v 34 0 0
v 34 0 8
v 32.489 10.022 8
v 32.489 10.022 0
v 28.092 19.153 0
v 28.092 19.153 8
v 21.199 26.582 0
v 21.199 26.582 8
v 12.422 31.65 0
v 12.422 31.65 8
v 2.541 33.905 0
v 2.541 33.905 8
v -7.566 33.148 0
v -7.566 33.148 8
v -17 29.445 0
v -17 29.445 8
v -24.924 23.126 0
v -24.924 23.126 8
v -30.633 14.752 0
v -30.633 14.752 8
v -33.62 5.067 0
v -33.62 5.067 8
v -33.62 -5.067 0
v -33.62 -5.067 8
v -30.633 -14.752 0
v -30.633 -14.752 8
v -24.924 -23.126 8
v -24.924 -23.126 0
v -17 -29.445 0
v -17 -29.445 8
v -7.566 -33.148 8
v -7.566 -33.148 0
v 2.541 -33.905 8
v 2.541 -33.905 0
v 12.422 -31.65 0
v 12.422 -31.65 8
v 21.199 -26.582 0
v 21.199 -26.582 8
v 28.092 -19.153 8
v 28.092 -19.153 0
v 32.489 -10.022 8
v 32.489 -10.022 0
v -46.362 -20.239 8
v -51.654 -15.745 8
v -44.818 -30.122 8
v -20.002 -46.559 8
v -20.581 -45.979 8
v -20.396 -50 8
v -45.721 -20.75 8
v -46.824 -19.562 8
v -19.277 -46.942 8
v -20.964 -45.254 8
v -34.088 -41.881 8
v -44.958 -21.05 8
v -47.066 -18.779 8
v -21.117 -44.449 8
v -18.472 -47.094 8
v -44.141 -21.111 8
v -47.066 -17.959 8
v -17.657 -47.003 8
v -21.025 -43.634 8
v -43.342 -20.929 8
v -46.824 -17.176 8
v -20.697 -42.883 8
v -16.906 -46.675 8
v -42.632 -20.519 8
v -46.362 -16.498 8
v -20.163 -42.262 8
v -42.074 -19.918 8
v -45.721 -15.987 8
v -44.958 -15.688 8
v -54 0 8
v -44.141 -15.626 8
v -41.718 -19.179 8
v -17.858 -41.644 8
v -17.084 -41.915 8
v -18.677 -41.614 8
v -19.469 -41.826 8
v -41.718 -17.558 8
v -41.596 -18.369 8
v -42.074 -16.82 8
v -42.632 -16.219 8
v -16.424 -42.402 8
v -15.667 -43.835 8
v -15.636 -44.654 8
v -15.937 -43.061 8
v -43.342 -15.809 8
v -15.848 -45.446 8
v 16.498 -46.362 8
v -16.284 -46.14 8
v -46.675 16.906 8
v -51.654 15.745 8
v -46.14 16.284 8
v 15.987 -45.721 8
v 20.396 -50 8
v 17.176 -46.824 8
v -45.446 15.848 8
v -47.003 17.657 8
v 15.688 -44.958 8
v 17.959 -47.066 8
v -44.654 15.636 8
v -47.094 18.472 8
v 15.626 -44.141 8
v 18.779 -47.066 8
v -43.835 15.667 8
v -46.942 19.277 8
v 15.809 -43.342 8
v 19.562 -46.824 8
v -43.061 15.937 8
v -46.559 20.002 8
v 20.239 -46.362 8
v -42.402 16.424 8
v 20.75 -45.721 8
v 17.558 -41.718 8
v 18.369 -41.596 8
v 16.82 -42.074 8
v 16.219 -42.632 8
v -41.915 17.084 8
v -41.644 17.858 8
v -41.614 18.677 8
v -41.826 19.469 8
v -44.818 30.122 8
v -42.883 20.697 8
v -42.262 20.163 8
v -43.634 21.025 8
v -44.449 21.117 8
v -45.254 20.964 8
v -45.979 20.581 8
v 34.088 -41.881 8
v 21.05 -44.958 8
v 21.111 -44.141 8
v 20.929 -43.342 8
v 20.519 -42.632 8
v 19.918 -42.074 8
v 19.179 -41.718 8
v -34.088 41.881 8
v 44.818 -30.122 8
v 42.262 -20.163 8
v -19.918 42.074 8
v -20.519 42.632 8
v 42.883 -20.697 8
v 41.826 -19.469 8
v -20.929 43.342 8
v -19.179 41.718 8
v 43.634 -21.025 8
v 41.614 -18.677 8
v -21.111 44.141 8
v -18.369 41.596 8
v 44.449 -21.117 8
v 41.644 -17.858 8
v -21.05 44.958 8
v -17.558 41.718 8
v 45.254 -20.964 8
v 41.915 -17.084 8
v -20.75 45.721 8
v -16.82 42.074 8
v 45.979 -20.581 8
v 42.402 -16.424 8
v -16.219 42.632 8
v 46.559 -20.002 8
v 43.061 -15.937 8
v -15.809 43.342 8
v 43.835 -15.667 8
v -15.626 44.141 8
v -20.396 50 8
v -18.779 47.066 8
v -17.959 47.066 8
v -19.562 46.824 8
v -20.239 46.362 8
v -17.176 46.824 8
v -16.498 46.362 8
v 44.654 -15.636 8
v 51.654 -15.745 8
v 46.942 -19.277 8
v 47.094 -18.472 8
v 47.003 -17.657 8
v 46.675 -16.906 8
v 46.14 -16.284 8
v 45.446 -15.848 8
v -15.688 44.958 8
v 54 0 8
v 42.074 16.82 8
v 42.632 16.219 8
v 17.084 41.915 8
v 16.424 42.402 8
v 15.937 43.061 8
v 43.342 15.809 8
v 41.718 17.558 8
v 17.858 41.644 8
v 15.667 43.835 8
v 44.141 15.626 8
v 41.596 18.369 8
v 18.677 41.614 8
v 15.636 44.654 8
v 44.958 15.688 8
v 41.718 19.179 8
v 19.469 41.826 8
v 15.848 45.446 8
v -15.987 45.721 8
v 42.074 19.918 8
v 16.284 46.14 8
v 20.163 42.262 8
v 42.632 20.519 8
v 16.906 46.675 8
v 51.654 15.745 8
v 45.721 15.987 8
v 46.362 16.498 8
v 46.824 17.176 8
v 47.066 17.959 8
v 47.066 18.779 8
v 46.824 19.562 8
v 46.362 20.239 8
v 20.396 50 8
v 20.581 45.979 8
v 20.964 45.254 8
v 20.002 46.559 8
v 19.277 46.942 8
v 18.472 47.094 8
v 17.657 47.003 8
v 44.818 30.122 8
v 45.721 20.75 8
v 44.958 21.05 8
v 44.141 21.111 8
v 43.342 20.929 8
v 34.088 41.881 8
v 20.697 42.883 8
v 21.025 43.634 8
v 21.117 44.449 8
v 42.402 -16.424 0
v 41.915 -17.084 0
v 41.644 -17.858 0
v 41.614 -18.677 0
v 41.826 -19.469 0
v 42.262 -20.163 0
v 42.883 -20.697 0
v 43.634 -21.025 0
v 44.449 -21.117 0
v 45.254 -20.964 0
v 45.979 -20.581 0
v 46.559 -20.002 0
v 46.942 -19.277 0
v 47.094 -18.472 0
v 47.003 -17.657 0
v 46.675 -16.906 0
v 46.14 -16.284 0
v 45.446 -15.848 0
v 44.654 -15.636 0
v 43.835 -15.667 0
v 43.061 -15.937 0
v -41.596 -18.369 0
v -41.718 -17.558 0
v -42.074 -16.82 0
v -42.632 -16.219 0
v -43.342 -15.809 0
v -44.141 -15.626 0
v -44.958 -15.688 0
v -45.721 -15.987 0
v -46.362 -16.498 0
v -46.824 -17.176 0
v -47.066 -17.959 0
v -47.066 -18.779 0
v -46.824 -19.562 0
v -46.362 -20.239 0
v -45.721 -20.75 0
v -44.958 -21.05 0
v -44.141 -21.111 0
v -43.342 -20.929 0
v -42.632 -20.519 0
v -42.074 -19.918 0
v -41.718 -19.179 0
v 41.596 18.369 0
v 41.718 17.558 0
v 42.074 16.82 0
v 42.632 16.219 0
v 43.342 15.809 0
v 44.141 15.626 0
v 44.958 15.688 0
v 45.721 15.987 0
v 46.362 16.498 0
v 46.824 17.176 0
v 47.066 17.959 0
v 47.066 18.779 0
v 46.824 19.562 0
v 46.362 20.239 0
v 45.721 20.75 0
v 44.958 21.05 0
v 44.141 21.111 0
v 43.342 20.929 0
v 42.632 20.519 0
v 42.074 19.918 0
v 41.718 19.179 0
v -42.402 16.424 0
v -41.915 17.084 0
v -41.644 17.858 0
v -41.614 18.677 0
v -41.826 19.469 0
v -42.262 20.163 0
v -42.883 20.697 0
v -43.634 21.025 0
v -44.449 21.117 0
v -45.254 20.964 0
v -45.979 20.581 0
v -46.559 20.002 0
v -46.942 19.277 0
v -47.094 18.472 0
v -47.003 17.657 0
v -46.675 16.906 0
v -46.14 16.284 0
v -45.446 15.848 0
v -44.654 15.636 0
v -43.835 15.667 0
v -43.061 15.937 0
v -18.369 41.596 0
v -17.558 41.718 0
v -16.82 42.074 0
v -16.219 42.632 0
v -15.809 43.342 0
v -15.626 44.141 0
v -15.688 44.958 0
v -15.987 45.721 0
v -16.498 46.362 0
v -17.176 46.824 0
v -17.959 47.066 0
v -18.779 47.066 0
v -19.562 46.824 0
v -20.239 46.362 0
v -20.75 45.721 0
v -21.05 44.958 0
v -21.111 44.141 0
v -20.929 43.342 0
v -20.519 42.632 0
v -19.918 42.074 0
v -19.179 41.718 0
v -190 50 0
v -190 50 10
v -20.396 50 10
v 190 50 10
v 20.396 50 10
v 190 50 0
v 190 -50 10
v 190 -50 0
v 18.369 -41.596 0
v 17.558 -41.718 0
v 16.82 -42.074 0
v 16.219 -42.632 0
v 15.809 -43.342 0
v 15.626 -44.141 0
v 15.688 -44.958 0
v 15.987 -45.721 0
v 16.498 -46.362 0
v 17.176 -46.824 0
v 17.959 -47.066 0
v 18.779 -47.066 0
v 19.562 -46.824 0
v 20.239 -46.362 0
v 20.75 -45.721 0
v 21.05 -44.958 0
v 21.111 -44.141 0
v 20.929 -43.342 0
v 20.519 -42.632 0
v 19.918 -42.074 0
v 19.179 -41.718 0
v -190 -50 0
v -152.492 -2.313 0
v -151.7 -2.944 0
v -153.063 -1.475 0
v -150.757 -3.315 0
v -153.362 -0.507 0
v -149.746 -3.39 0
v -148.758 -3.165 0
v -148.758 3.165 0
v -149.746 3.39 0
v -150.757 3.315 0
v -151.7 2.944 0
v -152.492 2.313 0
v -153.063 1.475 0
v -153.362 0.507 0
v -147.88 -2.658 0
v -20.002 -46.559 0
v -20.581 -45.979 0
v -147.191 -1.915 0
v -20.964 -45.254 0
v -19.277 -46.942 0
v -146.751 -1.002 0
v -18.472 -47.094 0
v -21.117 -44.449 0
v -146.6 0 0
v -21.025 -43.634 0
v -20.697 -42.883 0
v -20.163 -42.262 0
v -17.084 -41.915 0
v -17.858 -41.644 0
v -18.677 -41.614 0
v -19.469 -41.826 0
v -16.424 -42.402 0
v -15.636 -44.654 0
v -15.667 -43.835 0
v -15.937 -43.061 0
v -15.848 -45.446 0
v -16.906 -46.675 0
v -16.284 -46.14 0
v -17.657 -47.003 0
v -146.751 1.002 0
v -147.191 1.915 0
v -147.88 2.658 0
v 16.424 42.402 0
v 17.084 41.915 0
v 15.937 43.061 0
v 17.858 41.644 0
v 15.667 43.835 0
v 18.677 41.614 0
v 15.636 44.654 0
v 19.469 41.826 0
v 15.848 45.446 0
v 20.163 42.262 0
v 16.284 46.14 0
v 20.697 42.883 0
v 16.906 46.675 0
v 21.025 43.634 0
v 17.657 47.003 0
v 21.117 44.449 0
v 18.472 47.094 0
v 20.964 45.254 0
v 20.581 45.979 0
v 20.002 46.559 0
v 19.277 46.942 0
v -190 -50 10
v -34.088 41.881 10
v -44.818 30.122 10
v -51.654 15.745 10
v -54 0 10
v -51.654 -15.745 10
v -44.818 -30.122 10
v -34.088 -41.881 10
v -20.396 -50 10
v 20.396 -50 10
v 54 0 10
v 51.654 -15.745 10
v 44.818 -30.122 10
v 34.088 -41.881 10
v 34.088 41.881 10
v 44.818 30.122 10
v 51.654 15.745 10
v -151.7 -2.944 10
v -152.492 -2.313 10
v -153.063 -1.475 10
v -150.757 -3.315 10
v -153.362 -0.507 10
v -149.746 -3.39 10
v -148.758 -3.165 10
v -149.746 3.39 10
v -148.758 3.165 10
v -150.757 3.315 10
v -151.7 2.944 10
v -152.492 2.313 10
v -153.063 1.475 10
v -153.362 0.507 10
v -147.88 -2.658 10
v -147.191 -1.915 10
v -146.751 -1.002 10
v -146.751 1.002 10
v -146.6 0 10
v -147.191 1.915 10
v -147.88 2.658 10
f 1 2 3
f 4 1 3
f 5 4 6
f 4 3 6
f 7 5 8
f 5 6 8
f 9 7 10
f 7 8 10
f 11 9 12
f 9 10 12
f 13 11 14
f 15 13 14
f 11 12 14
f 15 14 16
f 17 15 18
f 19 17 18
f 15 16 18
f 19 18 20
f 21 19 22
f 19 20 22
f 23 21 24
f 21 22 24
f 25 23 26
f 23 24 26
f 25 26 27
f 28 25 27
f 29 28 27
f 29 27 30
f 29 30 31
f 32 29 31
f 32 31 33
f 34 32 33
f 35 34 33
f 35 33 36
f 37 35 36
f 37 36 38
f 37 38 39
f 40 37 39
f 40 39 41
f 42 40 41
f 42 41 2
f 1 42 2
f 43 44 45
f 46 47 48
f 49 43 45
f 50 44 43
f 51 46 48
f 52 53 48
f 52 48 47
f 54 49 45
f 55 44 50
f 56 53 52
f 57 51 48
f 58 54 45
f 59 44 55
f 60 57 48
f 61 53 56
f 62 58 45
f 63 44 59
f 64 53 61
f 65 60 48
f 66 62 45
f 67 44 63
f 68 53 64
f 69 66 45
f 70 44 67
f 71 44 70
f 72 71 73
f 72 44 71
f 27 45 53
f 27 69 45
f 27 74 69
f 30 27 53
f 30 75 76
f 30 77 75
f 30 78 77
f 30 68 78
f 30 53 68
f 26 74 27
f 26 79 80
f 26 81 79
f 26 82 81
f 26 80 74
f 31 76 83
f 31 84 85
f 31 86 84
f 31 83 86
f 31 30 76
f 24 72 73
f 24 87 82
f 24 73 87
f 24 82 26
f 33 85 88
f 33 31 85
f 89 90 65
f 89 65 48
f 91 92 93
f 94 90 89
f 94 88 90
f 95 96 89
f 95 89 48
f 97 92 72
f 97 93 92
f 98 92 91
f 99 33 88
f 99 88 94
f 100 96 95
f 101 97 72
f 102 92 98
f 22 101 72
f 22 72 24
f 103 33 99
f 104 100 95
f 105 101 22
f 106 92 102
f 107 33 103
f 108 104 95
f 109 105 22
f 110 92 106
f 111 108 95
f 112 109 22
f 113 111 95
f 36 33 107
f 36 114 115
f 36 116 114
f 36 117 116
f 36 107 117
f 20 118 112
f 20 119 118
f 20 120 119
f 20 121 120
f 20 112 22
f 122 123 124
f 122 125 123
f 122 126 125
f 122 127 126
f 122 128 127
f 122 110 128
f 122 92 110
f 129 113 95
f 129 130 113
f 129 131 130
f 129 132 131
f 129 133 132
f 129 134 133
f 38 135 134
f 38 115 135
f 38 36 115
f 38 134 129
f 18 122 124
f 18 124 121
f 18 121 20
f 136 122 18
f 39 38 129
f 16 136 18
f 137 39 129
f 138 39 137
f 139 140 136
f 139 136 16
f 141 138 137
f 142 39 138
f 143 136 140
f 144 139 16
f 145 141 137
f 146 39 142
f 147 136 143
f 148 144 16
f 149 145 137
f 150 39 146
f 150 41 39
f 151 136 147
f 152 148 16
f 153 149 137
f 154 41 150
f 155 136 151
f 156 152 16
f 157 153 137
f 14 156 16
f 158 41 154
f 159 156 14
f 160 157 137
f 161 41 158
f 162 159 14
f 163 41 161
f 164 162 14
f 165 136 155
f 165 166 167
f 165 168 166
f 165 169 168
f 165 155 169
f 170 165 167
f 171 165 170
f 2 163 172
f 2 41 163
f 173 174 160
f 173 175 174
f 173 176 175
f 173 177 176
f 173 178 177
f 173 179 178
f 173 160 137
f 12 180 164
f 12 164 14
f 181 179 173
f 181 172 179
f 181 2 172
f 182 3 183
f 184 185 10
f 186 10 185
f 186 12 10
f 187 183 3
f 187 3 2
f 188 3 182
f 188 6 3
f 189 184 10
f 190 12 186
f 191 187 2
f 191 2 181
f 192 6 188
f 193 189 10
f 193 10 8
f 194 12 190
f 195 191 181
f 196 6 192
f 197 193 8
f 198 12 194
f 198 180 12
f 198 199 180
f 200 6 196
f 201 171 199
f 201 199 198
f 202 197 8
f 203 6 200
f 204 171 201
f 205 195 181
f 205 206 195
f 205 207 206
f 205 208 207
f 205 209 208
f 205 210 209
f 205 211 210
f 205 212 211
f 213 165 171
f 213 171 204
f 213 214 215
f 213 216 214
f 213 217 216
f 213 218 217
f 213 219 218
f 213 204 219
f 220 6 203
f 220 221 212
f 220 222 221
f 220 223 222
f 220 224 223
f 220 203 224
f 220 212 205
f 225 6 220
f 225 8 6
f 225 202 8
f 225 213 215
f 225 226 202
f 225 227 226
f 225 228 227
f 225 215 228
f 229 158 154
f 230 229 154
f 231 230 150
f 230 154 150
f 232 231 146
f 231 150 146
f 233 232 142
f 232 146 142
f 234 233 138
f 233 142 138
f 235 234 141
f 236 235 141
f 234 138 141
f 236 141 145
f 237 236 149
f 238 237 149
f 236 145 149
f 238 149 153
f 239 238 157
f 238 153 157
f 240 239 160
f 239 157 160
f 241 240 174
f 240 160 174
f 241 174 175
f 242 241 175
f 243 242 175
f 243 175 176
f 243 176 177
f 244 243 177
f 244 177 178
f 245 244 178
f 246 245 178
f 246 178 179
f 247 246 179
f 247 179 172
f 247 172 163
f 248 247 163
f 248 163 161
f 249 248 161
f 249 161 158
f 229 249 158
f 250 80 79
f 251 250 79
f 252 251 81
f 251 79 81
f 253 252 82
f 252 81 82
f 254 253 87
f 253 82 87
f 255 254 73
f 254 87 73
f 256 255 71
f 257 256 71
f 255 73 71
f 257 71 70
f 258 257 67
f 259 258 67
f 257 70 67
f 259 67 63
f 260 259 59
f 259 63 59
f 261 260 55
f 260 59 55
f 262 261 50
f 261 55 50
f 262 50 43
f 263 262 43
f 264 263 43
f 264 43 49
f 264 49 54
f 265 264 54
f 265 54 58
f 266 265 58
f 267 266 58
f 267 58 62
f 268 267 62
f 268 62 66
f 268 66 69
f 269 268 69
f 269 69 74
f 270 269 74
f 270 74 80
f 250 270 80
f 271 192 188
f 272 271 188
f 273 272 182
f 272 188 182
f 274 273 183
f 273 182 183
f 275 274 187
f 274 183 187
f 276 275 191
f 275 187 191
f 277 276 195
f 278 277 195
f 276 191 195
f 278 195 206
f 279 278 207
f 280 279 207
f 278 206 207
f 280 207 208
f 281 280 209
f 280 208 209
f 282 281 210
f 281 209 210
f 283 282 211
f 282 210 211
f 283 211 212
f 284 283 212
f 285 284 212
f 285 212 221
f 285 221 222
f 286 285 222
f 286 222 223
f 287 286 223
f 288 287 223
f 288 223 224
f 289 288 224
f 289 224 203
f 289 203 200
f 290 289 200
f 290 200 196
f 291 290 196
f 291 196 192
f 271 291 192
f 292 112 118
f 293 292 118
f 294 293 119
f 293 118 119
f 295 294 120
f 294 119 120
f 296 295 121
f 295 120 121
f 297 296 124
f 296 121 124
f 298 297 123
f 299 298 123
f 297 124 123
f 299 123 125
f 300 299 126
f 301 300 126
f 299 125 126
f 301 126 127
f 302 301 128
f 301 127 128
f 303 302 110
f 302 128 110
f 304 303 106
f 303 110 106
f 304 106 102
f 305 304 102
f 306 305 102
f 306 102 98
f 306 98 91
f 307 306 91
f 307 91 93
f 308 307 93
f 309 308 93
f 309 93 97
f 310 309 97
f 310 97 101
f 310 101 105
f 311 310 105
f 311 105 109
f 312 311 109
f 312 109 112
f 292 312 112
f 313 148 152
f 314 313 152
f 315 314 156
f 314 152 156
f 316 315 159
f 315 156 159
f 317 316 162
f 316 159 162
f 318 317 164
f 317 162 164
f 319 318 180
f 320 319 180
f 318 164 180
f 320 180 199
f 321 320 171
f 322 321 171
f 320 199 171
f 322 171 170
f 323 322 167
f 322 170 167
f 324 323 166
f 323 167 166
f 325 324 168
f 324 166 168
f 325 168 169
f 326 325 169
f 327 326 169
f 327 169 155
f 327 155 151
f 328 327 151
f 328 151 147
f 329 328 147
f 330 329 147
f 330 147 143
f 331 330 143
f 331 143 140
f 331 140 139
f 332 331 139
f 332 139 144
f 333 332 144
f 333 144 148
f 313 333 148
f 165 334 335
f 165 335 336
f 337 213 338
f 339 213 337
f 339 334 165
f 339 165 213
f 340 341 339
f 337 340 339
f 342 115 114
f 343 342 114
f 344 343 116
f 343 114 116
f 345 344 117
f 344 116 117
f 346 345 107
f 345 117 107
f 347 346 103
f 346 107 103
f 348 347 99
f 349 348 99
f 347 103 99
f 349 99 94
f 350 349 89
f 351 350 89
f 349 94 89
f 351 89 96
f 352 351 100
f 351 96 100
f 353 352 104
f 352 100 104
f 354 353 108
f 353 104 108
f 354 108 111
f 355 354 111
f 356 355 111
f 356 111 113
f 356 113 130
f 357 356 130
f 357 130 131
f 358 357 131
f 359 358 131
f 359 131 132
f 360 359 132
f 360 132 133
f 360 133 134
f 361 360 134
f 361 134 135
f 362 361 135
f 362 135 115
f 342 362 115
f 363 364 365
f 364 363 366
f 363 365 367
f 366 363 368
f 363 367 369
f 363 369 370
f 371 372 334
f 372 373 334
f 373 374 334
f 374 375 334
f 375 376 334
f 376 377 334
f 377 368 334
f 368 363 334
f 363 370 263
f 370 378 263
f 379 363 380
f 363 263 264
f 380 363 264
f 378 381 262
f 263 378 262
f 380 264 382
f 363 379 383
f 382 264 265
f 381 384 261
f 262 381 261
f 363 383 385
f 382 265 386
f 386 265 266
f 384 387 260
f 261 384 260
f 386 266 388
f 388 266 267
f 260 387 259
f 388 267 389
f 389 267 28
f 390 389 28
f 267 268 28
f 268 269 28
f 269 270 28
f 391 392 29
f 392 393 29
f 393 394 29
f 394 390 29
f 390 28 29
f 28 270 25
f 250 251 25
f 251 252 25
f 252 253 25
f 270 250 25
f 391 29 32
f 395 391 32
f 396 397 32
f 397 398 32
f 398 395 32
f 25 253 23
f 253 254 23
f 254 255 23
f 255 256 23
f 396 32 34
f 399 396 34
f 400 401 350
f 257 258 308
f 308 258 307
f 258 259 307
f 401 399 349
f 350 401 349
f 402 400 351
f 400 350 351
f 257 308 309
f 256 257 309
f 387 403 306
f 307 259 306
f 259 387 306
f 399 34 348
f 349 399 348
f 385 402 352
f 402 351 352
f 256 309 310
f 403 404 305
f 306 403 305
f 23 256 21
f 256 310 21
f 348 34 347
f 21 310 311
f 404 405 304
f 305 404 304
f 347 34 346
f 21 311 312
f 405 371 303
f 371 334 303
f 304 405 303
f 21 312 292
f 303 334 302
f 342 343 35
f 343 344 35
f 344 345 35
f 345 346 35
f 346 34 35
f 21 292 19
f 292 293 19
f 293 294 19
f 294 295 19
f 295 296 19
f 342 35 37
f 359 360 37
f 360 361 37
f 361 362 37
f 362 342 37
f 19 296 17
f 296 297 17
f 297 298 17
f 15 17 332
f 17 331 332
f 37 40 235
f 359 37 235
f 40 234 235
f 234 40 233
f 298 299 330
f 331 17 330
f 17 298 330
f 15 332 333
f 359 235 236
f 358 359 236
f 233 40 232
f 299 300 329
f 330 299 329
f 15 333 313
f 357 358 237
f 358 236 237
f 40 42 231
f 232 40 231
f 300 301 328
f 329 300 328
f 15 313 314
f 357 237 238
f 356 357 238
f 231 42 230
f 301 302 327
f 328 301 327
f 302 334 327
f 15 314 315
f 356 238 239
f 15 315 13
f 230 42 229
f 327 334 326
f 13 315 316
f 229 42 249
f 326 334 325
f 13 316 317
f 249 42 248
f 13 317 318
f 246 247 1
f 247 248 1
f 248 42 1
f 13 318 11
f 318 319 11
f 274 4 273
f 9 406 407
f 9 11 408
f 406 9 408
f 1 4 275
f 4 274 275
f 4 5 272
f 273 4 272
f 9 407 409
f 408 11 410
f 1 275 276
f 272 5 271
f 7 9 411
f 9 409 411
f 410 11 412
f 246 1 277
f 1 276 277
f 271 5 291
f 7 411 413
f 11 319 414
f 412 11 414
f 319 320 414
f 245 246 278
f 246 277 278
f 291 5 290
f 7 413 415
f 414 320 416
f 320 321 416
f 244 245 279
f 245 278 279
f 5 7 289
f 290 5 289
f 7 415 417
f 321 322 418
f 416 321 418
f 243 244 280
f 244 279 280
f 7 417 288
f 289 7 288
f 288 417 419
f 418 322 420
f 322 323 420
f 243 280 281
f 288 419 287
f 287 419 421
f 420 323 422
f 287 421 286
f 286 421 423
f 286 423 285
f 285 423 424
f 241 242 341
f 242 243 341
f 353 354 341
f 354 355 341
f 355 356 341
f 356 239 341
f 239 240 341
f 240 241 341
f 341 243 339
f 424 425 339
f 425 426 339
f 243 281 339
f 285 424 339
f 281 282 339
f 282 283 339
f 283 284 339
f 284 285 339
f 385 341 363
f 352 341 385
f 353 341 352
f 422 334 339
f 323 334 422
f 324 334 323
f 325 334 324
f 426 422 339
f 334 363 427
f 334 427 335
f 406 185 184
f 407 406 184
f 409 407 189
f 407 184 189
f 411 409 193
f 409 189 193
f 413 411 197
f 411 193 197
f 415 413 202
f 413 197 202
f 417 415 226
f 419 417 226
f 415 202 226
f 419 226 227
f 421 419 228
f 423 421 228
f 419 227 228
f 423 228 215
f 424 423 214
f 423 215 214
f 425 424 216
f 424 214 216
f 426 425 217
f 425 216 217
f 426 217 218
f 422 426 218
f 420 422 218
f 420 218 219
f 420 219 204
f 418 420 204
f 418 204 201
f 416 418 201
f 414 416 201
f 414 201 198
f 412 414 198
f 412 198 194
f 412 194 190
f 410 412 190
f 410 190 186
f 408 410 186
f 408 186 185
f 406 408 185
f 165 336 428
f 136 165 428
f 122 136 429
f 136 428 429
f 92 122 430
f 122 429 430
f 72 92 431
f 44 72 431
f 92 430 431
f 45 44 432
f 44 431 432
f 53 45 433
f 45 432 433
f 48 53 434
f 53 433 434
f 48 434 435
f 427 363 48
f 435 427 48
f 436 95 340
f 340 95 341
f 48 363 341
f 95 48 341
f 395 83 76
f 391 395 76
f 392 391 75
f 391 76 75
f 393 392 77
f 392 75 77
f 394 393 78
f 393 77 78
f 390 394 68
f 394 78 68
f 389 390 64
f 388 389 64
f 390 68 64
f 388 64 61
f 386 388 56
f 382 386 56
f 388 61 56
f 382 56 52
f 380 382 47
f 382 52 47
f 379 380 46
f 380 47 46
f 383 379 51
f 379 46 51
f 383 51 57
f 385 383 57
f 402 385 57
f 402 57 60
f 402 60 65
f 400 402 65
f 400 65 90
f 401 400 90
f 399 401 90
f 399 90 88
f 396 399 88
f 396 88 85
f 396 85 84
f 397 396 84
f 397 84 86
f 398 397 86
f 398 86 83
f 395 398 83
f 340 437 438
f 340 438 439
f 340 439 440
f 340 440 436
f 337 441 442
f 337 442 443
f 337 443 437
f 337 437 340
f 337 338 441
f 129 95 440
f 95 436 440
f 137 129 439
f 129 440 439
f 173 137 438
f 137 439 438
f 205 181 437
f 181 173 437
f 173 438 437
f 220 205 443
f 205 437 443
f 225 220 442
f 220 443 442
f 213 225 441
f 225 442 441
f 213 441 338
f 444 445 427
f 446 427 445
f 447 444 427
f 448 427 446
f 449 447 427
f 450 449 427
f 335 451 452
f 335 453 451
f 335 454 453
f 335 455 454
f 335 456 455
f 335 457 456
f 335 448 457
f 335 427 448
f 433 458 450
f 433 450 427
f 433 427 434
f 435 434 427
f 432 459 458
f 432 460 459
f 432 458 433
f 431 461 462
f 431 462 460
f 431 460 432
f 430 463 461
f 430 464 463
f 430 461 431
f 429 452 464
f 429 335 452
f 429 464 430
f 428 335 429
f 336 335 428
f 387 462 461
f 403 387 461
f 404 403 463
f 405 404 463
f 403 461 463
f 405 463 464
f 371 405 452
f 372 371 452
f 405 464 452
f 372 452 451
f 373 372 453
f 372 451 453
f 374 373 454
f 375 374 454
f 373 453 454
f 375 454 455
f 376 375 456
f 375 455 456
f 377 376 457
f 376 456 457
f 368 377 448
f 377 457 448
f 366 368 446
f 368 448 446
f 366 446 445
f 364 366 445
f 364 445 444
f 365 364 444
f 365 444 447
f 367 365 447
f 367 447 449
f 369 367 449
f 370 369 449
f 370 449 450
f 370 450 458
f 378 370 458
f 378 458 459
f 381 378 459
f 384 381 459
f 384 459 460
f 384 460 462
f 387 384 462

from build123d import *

# Parameters (mm, degrees)
SCHIZZO1_W                   = 380
SCHIZZO1_H                   = 100
ESTRUSIONE_ESTRUSIONE1_DEPTH = 10
SCHIZZO2_R                   = 54
TAGLIO_ESTRUSIONE1_DEPTH     = 2
SCHIZZO3_R                   = 2.75
TAGLIO_ESTRUSIONE2_DEPTH     = 197.631635298
RIPETIZIONECIRCOLARE1_COUNT  = 8
SCHIZZO4_R                   = 34
TAGLIO_ESTRUSIONE3_DEPTH     = 197.631635298
SCHIZZO5_R                   = 3.4
TAGLIO_ESTRUSIONE4_DEPTH     = 197.723155729


with BuildPart() as part:
    # Schizzo1 → Estrusione-Estrusione1 (new body)
    with BuildSketch(Plane.XY):
        Rectangle(SCHIZZO1_W, SCHIZZO1_H)
    extrude(amount=ESTRUSIONE_ESTRUSIONE1_DEPTH)

    # Schizzo2 → Taglio-Estrusione1 (cut)
    with BuildSketch(Plane.XY.offset(10)):
        Circle(SCHIZZO2_R)
    extrude(amount=-TAGLIO_ESTRUSIONE1_DEPTH, mode=Mode.SUBTRACT)

    # Schizzo3 → Taglio-Estrusione2 (cut, through all)
    with BuildSketch(Plane.XY.offset(8)):
        with Locations((-44.346217561, -18.368804754)):
            Circle(SCHIZZO3_R)
    taglio_estrusione2 = extrude(amount=-TAGLIO_ESTRUSIONE2_DEPTH, mode=Mode.SUBTRACT)

    # RipetizioneCircolare1: Taglio-Estrusione2 ×8 about axis
    ripetizionecircolare1_axis = Axis((0, 0, 0), (0, 0, 1))
    for i in range(1, RIPETIZIONECIRCOLARE1_COUNT):
        add(taglio_estrusione2.rotate(ripetizionecircolare1_axis, i * 360 / RIPETIZIONECIRCOLARE1_COUNT), mode=Mode.SUBTRACT)

    # Schizzo4 → Taglio-Estrusione3 (cut, through all)
    with BuildSketch(Plane.XY.offset(8)):
        Circle(SCHIZZO4_R)
    extrude(amount=-TAGLIO_ESTRUSIONE3_DEPTH, mode=Mode.SUBTRACT)

    # Schizzo5 → Taglio-Estrusione4 (cut, through all)
    with BuildSketch(Plane.XY.offset(10)):
        with Locations((-150, 0)):
            Circle(SCHIZZO5_R)
    extrude(amount=-TAGLIO_ESTRUSIONE4_DEPTH, mode=Mode.SUBTRACT)


solid = part.part
